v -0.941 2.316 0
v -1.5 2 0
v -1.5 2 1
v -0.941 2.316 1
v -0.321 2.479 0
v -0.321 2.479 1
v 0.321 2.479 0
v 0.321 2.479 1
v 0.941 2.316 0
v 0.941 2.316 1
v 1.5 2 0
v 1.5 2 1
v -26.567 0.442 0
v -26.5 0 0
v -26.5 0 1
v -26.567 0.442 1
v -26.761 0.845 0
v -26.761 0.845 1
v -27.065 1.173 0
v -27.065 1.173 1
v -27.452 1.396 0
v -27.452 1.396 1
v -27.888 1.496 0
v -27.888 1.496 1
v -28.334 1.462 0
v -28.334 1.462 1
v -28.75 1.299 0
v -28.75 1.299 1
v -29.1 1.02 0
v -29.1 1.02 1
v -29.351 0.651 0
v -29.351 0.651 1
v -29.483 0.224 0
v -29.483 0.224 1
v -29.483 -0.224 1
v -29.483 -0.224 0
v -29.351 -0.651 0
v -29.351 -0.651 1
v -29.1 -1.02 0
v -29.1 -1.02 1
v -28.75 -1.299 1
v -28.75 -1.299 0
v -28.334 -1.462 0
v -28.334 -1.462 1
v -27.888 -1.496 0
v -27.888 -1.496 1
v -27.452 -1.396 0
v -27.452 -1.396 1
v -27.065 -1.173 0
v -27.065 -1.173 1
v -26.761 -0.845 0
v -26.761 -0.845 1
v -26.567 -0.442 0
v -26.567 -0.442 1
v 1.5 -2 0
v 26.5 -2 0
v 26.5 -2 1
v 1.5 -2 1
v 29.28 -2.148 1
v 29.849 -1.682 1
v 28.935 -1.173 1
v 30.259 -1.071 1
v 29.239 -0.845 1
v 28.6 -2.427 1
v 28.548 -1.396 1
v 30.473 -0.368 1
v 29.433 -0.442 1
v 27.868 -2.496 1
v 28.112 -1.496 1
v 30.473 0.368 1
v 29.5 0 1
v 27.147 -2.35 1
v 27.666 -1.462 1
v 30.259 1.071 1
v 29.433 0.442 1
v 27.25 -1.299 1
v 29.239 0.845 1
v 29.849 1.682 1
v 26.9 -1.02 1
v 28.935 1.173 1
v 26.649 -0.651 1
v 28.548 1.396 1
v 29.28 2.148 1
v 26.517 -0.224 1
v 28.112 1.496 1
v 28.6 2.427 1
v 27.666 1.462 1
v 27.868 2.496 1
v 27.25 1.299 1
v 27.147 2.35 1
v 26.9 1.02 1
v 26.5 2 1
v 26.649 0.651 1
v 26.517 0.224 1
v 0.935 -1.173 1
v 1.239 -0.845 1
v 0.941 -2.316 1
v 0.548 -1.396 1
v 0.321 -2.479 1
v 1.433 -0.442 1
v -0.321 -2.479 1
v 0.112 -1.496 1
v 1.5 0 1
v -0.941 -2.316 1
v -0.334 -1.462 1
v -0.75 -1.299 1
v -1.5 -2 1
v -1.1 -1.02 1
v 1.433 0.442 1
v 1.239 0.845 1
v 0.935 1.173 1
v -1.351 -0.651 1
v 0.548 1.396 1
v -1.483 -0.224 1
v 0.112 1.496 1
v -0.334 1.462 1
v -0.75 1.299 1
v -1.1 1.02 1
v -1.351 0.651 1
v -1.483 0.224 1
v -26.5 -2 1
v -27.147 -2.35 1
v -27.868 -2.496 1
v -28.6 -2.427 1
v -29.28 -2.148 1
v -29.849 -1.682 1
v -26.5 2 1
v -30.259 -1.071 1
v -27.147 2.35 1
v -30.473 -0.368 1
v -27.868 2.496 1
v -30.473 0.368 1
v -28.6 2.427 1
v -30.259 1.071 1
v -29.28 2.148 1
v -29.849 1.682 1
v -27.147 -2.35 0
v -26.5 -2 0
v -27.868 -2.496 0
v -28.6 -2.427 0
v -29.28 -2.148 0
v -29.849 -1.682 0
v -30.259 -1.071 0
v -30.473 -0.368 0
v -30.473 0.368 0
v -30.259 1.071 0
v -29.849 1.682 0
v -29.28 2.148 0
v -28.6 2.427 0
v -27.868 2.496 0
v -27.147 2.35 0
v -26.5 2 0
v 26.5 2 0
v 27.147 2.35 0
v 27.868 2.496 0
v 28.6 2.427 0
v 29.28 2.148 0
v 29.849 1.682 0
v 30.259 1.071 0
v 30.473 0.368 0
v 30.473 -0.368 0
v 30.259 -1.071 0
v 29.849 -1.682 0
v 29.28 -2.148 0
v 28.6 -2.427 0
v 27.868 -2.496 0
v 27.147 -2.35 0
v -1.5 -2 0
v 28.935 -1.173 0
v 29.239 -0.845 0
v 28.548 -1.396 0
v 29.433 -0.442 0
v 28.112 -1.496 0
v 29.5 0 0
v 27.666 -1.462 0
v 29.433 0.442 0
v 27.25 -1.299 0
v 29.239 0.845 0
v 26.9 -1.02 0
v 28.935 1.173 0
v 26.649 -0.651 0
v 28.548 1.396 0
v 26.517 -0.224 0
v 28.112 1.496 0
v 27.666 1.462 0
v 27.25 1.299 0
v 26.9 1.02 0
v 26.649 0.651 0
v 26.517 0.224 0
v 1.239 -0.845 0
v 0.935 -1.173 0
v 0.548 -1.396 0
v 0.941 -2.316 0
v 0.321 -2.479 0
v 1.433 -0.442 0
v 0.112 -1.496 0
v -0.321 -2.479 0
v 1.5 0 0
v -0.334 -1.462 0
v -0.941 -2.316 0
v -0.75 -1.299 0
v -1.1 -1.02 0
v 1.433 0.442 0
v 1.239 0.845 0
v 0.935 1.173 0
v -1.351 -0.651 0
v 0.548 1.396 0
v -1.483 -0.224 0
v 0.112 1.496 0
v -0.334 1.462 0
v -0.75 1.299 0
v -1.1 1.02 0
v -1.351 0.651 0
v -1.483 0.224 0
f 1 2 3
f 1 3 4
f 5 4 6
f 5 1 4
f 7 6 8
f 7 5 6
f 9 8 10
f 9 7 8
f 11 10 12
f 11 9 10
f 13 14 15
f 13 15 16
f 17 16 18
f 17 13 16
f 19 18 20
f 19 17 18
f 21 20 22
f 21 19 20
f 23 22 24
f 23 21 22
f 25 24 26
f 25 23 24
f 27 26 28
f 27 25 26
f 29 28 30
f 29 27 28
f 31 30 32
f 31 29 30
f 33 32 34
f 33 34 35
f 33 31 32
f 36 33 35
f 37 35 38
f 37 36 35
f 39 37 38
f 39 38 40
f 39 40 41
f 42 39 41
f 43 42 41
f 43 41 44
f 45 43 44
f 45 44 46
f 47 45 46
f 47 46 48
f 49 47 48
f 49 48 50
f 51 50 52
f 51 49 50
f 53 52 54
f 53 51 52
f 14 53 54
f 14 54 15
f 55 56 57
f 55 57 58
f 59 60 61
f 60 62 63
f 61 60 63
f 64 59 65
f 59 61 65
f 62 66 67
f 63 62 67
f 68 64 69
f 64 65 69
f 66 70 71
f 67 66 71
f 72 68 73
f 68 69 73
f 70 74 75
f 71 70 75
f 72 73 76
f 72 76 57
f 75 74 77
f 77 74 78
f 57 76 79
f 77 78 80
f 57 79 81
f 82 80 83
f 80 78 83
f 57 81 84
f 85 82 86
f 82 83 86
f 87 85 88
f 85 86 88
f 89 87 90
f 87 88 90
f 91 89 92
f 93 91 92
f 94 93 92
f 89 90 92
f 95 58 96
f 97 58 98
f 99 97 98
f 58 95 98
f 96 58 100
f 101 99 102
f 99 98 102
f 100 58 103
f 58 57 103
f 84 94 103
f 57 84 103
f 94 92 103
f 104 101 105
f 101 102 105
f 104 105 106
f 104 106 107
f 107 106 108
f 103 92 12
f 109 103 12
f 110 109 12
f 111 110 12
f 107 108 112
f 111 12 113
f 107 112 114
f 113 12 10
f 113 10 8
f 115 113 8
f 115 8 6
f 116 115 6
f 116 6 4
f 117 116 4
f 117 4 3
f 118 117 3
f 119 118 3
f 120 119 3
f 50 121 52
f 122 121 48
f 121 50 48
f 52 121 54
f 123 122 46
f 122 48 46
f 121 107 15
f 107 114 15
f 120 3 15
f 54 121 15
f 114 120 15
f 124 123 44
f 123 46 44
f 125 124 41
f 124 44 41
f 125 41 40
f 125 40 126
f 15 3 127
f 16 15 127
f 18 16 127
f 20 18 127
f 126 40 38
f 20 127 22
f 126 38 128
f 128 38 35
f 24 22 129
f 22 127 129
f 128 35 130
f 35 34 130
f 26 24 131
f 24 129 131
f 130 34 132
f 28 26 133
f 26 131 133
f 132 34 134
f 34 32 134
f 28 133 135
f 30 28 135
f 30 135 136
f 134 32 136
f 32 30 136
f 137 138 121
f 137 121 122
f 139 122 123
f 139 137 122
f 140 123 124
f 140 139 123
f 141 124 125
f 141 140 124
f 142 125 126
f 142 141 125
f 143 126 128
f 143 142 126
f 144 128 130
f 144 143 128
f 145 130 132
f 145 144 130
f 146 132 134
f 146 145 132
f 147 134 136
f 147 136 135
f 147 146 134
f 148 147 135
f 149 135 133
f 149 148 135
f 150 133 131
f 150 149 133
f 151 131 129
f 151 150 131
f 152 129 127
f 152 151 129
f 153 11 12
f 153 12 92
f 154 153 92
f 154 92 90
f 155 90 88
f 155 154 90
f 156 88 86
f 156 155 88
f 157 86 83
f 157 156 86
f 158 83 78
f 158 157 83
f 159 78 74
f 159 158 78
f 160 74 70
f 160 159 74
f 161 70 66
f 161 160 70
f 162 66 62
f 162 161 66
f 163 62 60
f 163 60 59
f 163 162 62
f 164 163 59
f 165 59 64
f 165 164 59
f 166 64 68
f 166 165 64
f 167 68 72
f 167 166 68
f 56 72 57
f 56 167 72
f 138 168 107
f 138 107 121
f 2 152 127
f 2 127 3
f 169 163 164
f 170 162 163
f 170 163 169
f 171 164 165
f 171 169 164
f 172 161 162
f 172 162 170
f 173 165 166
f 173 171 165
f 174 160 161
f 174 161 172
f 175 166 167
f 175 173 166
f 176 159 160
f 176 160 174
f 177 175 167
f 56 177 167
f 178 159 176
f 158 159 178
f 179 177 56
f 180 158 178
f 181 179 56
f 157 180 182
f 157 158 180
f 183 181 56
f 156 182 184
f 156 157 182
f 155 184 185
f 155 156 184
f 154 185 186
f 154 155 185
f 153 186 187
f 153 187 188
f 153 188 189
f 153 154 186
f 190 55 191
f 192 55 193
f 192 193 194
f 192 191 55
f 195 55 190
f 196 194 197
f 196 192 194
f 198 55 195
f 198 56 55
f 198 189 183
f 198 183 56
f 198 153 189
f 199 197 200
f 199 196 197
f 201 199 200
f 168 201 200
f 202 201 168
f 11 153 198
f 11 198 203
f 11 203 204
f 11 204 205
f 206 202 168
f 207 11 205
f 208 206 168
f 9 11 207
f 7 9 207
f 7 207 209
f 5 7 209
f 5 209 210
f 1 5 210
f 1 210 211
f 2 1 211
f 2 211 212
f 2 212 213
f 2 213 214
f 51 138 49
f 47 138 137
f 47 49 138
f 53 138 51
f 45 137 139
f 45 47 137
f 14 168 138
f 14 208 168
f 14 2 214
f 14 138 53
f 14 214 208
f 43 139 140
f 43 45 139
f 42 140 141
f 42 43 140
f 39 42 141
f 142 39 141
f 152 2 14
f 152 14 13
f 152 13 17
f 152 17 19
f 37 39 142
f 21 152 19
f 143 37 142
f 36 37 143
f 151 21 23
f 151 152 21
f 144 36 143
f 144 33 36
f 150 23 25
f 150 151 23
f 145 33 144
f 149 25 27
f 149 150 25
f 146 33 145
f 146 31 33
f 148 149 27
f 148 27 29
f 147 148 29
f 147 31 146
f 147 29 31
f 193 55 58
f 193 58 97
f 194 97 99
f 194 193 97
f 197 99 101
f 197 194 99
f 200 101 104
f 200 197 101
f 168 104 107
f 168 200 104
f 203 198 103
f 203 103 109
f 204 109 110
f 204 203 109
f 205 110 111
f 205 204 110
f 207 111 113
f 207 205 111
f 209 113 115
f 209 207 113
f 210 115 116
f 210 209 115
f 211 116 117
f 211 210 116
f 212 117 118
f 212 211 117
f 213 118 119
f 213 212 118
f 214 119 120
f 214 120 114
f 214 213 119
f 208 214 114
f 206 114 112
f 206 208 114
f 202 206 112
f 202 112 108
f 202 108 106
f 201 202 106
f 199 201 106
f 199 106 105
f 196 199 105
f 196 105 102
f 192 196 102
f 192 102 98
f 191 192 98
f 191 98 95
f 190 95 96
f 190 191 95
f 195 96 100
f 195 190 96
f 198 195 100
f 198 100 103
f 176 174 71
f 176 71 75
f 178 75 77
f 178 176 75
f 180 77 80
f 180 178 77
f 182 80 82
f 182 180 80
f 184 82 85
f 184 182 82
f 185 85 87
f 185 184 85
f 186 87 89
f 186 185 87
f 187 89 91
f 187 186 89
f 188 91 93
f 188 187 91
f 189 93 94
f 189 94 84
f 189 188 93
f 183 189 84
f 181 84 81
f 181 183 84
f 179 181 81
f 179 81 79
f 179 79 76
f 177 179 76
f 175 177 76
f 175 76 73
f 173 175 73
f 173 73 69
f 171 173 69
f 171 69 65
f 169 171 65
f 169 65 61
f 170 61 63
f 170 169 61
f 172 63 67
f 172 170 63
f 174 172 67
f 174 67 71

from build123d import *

# Parameters (mm, degrees)
SKETCH_1_R      = 1.5
EXTRUDE_1_DEPTH = 1


with BuildPart() as part:
    # 草图1 → 凸台-拉伸1 (new body)
    with BuildSketch(Plane.XY):
        with BuildLine():
            Line((1.5, 2), (26.5, 2))
            ThreePointArc((26.5, 2), (30.5, 0), (26.5, -2))
            Line((26.5, -2), (1.5, -2))
            ThreePointArc((1.5, -2), (0, -2.5), (-1.5, -2))
            Line((-1.5, -2), (-26.5, -2))
            ThreePointArc((-26.5, -2), (-30.5, 0), (-26.5, 2))
            Line((-26.5, 2), (-1.5, 2))
            ThreePointArc((-1.5, 2), (0, 2.5), (1.5, 2))
        make_face()
        with Locations((-28, 0)):
            Circle(SKETCH_1_R, mode=Mode.SUBTRACT)
        Circle(SKETCH_1_R, mode=Mode.SUBTRACT)
        with Locations((28, 0)):
            Circle(SKETCH_1_R, mode=Mode.SUBTRACT)
    extrude(amount=EXTRUDE_1_DEPTH)


solid = part.part
